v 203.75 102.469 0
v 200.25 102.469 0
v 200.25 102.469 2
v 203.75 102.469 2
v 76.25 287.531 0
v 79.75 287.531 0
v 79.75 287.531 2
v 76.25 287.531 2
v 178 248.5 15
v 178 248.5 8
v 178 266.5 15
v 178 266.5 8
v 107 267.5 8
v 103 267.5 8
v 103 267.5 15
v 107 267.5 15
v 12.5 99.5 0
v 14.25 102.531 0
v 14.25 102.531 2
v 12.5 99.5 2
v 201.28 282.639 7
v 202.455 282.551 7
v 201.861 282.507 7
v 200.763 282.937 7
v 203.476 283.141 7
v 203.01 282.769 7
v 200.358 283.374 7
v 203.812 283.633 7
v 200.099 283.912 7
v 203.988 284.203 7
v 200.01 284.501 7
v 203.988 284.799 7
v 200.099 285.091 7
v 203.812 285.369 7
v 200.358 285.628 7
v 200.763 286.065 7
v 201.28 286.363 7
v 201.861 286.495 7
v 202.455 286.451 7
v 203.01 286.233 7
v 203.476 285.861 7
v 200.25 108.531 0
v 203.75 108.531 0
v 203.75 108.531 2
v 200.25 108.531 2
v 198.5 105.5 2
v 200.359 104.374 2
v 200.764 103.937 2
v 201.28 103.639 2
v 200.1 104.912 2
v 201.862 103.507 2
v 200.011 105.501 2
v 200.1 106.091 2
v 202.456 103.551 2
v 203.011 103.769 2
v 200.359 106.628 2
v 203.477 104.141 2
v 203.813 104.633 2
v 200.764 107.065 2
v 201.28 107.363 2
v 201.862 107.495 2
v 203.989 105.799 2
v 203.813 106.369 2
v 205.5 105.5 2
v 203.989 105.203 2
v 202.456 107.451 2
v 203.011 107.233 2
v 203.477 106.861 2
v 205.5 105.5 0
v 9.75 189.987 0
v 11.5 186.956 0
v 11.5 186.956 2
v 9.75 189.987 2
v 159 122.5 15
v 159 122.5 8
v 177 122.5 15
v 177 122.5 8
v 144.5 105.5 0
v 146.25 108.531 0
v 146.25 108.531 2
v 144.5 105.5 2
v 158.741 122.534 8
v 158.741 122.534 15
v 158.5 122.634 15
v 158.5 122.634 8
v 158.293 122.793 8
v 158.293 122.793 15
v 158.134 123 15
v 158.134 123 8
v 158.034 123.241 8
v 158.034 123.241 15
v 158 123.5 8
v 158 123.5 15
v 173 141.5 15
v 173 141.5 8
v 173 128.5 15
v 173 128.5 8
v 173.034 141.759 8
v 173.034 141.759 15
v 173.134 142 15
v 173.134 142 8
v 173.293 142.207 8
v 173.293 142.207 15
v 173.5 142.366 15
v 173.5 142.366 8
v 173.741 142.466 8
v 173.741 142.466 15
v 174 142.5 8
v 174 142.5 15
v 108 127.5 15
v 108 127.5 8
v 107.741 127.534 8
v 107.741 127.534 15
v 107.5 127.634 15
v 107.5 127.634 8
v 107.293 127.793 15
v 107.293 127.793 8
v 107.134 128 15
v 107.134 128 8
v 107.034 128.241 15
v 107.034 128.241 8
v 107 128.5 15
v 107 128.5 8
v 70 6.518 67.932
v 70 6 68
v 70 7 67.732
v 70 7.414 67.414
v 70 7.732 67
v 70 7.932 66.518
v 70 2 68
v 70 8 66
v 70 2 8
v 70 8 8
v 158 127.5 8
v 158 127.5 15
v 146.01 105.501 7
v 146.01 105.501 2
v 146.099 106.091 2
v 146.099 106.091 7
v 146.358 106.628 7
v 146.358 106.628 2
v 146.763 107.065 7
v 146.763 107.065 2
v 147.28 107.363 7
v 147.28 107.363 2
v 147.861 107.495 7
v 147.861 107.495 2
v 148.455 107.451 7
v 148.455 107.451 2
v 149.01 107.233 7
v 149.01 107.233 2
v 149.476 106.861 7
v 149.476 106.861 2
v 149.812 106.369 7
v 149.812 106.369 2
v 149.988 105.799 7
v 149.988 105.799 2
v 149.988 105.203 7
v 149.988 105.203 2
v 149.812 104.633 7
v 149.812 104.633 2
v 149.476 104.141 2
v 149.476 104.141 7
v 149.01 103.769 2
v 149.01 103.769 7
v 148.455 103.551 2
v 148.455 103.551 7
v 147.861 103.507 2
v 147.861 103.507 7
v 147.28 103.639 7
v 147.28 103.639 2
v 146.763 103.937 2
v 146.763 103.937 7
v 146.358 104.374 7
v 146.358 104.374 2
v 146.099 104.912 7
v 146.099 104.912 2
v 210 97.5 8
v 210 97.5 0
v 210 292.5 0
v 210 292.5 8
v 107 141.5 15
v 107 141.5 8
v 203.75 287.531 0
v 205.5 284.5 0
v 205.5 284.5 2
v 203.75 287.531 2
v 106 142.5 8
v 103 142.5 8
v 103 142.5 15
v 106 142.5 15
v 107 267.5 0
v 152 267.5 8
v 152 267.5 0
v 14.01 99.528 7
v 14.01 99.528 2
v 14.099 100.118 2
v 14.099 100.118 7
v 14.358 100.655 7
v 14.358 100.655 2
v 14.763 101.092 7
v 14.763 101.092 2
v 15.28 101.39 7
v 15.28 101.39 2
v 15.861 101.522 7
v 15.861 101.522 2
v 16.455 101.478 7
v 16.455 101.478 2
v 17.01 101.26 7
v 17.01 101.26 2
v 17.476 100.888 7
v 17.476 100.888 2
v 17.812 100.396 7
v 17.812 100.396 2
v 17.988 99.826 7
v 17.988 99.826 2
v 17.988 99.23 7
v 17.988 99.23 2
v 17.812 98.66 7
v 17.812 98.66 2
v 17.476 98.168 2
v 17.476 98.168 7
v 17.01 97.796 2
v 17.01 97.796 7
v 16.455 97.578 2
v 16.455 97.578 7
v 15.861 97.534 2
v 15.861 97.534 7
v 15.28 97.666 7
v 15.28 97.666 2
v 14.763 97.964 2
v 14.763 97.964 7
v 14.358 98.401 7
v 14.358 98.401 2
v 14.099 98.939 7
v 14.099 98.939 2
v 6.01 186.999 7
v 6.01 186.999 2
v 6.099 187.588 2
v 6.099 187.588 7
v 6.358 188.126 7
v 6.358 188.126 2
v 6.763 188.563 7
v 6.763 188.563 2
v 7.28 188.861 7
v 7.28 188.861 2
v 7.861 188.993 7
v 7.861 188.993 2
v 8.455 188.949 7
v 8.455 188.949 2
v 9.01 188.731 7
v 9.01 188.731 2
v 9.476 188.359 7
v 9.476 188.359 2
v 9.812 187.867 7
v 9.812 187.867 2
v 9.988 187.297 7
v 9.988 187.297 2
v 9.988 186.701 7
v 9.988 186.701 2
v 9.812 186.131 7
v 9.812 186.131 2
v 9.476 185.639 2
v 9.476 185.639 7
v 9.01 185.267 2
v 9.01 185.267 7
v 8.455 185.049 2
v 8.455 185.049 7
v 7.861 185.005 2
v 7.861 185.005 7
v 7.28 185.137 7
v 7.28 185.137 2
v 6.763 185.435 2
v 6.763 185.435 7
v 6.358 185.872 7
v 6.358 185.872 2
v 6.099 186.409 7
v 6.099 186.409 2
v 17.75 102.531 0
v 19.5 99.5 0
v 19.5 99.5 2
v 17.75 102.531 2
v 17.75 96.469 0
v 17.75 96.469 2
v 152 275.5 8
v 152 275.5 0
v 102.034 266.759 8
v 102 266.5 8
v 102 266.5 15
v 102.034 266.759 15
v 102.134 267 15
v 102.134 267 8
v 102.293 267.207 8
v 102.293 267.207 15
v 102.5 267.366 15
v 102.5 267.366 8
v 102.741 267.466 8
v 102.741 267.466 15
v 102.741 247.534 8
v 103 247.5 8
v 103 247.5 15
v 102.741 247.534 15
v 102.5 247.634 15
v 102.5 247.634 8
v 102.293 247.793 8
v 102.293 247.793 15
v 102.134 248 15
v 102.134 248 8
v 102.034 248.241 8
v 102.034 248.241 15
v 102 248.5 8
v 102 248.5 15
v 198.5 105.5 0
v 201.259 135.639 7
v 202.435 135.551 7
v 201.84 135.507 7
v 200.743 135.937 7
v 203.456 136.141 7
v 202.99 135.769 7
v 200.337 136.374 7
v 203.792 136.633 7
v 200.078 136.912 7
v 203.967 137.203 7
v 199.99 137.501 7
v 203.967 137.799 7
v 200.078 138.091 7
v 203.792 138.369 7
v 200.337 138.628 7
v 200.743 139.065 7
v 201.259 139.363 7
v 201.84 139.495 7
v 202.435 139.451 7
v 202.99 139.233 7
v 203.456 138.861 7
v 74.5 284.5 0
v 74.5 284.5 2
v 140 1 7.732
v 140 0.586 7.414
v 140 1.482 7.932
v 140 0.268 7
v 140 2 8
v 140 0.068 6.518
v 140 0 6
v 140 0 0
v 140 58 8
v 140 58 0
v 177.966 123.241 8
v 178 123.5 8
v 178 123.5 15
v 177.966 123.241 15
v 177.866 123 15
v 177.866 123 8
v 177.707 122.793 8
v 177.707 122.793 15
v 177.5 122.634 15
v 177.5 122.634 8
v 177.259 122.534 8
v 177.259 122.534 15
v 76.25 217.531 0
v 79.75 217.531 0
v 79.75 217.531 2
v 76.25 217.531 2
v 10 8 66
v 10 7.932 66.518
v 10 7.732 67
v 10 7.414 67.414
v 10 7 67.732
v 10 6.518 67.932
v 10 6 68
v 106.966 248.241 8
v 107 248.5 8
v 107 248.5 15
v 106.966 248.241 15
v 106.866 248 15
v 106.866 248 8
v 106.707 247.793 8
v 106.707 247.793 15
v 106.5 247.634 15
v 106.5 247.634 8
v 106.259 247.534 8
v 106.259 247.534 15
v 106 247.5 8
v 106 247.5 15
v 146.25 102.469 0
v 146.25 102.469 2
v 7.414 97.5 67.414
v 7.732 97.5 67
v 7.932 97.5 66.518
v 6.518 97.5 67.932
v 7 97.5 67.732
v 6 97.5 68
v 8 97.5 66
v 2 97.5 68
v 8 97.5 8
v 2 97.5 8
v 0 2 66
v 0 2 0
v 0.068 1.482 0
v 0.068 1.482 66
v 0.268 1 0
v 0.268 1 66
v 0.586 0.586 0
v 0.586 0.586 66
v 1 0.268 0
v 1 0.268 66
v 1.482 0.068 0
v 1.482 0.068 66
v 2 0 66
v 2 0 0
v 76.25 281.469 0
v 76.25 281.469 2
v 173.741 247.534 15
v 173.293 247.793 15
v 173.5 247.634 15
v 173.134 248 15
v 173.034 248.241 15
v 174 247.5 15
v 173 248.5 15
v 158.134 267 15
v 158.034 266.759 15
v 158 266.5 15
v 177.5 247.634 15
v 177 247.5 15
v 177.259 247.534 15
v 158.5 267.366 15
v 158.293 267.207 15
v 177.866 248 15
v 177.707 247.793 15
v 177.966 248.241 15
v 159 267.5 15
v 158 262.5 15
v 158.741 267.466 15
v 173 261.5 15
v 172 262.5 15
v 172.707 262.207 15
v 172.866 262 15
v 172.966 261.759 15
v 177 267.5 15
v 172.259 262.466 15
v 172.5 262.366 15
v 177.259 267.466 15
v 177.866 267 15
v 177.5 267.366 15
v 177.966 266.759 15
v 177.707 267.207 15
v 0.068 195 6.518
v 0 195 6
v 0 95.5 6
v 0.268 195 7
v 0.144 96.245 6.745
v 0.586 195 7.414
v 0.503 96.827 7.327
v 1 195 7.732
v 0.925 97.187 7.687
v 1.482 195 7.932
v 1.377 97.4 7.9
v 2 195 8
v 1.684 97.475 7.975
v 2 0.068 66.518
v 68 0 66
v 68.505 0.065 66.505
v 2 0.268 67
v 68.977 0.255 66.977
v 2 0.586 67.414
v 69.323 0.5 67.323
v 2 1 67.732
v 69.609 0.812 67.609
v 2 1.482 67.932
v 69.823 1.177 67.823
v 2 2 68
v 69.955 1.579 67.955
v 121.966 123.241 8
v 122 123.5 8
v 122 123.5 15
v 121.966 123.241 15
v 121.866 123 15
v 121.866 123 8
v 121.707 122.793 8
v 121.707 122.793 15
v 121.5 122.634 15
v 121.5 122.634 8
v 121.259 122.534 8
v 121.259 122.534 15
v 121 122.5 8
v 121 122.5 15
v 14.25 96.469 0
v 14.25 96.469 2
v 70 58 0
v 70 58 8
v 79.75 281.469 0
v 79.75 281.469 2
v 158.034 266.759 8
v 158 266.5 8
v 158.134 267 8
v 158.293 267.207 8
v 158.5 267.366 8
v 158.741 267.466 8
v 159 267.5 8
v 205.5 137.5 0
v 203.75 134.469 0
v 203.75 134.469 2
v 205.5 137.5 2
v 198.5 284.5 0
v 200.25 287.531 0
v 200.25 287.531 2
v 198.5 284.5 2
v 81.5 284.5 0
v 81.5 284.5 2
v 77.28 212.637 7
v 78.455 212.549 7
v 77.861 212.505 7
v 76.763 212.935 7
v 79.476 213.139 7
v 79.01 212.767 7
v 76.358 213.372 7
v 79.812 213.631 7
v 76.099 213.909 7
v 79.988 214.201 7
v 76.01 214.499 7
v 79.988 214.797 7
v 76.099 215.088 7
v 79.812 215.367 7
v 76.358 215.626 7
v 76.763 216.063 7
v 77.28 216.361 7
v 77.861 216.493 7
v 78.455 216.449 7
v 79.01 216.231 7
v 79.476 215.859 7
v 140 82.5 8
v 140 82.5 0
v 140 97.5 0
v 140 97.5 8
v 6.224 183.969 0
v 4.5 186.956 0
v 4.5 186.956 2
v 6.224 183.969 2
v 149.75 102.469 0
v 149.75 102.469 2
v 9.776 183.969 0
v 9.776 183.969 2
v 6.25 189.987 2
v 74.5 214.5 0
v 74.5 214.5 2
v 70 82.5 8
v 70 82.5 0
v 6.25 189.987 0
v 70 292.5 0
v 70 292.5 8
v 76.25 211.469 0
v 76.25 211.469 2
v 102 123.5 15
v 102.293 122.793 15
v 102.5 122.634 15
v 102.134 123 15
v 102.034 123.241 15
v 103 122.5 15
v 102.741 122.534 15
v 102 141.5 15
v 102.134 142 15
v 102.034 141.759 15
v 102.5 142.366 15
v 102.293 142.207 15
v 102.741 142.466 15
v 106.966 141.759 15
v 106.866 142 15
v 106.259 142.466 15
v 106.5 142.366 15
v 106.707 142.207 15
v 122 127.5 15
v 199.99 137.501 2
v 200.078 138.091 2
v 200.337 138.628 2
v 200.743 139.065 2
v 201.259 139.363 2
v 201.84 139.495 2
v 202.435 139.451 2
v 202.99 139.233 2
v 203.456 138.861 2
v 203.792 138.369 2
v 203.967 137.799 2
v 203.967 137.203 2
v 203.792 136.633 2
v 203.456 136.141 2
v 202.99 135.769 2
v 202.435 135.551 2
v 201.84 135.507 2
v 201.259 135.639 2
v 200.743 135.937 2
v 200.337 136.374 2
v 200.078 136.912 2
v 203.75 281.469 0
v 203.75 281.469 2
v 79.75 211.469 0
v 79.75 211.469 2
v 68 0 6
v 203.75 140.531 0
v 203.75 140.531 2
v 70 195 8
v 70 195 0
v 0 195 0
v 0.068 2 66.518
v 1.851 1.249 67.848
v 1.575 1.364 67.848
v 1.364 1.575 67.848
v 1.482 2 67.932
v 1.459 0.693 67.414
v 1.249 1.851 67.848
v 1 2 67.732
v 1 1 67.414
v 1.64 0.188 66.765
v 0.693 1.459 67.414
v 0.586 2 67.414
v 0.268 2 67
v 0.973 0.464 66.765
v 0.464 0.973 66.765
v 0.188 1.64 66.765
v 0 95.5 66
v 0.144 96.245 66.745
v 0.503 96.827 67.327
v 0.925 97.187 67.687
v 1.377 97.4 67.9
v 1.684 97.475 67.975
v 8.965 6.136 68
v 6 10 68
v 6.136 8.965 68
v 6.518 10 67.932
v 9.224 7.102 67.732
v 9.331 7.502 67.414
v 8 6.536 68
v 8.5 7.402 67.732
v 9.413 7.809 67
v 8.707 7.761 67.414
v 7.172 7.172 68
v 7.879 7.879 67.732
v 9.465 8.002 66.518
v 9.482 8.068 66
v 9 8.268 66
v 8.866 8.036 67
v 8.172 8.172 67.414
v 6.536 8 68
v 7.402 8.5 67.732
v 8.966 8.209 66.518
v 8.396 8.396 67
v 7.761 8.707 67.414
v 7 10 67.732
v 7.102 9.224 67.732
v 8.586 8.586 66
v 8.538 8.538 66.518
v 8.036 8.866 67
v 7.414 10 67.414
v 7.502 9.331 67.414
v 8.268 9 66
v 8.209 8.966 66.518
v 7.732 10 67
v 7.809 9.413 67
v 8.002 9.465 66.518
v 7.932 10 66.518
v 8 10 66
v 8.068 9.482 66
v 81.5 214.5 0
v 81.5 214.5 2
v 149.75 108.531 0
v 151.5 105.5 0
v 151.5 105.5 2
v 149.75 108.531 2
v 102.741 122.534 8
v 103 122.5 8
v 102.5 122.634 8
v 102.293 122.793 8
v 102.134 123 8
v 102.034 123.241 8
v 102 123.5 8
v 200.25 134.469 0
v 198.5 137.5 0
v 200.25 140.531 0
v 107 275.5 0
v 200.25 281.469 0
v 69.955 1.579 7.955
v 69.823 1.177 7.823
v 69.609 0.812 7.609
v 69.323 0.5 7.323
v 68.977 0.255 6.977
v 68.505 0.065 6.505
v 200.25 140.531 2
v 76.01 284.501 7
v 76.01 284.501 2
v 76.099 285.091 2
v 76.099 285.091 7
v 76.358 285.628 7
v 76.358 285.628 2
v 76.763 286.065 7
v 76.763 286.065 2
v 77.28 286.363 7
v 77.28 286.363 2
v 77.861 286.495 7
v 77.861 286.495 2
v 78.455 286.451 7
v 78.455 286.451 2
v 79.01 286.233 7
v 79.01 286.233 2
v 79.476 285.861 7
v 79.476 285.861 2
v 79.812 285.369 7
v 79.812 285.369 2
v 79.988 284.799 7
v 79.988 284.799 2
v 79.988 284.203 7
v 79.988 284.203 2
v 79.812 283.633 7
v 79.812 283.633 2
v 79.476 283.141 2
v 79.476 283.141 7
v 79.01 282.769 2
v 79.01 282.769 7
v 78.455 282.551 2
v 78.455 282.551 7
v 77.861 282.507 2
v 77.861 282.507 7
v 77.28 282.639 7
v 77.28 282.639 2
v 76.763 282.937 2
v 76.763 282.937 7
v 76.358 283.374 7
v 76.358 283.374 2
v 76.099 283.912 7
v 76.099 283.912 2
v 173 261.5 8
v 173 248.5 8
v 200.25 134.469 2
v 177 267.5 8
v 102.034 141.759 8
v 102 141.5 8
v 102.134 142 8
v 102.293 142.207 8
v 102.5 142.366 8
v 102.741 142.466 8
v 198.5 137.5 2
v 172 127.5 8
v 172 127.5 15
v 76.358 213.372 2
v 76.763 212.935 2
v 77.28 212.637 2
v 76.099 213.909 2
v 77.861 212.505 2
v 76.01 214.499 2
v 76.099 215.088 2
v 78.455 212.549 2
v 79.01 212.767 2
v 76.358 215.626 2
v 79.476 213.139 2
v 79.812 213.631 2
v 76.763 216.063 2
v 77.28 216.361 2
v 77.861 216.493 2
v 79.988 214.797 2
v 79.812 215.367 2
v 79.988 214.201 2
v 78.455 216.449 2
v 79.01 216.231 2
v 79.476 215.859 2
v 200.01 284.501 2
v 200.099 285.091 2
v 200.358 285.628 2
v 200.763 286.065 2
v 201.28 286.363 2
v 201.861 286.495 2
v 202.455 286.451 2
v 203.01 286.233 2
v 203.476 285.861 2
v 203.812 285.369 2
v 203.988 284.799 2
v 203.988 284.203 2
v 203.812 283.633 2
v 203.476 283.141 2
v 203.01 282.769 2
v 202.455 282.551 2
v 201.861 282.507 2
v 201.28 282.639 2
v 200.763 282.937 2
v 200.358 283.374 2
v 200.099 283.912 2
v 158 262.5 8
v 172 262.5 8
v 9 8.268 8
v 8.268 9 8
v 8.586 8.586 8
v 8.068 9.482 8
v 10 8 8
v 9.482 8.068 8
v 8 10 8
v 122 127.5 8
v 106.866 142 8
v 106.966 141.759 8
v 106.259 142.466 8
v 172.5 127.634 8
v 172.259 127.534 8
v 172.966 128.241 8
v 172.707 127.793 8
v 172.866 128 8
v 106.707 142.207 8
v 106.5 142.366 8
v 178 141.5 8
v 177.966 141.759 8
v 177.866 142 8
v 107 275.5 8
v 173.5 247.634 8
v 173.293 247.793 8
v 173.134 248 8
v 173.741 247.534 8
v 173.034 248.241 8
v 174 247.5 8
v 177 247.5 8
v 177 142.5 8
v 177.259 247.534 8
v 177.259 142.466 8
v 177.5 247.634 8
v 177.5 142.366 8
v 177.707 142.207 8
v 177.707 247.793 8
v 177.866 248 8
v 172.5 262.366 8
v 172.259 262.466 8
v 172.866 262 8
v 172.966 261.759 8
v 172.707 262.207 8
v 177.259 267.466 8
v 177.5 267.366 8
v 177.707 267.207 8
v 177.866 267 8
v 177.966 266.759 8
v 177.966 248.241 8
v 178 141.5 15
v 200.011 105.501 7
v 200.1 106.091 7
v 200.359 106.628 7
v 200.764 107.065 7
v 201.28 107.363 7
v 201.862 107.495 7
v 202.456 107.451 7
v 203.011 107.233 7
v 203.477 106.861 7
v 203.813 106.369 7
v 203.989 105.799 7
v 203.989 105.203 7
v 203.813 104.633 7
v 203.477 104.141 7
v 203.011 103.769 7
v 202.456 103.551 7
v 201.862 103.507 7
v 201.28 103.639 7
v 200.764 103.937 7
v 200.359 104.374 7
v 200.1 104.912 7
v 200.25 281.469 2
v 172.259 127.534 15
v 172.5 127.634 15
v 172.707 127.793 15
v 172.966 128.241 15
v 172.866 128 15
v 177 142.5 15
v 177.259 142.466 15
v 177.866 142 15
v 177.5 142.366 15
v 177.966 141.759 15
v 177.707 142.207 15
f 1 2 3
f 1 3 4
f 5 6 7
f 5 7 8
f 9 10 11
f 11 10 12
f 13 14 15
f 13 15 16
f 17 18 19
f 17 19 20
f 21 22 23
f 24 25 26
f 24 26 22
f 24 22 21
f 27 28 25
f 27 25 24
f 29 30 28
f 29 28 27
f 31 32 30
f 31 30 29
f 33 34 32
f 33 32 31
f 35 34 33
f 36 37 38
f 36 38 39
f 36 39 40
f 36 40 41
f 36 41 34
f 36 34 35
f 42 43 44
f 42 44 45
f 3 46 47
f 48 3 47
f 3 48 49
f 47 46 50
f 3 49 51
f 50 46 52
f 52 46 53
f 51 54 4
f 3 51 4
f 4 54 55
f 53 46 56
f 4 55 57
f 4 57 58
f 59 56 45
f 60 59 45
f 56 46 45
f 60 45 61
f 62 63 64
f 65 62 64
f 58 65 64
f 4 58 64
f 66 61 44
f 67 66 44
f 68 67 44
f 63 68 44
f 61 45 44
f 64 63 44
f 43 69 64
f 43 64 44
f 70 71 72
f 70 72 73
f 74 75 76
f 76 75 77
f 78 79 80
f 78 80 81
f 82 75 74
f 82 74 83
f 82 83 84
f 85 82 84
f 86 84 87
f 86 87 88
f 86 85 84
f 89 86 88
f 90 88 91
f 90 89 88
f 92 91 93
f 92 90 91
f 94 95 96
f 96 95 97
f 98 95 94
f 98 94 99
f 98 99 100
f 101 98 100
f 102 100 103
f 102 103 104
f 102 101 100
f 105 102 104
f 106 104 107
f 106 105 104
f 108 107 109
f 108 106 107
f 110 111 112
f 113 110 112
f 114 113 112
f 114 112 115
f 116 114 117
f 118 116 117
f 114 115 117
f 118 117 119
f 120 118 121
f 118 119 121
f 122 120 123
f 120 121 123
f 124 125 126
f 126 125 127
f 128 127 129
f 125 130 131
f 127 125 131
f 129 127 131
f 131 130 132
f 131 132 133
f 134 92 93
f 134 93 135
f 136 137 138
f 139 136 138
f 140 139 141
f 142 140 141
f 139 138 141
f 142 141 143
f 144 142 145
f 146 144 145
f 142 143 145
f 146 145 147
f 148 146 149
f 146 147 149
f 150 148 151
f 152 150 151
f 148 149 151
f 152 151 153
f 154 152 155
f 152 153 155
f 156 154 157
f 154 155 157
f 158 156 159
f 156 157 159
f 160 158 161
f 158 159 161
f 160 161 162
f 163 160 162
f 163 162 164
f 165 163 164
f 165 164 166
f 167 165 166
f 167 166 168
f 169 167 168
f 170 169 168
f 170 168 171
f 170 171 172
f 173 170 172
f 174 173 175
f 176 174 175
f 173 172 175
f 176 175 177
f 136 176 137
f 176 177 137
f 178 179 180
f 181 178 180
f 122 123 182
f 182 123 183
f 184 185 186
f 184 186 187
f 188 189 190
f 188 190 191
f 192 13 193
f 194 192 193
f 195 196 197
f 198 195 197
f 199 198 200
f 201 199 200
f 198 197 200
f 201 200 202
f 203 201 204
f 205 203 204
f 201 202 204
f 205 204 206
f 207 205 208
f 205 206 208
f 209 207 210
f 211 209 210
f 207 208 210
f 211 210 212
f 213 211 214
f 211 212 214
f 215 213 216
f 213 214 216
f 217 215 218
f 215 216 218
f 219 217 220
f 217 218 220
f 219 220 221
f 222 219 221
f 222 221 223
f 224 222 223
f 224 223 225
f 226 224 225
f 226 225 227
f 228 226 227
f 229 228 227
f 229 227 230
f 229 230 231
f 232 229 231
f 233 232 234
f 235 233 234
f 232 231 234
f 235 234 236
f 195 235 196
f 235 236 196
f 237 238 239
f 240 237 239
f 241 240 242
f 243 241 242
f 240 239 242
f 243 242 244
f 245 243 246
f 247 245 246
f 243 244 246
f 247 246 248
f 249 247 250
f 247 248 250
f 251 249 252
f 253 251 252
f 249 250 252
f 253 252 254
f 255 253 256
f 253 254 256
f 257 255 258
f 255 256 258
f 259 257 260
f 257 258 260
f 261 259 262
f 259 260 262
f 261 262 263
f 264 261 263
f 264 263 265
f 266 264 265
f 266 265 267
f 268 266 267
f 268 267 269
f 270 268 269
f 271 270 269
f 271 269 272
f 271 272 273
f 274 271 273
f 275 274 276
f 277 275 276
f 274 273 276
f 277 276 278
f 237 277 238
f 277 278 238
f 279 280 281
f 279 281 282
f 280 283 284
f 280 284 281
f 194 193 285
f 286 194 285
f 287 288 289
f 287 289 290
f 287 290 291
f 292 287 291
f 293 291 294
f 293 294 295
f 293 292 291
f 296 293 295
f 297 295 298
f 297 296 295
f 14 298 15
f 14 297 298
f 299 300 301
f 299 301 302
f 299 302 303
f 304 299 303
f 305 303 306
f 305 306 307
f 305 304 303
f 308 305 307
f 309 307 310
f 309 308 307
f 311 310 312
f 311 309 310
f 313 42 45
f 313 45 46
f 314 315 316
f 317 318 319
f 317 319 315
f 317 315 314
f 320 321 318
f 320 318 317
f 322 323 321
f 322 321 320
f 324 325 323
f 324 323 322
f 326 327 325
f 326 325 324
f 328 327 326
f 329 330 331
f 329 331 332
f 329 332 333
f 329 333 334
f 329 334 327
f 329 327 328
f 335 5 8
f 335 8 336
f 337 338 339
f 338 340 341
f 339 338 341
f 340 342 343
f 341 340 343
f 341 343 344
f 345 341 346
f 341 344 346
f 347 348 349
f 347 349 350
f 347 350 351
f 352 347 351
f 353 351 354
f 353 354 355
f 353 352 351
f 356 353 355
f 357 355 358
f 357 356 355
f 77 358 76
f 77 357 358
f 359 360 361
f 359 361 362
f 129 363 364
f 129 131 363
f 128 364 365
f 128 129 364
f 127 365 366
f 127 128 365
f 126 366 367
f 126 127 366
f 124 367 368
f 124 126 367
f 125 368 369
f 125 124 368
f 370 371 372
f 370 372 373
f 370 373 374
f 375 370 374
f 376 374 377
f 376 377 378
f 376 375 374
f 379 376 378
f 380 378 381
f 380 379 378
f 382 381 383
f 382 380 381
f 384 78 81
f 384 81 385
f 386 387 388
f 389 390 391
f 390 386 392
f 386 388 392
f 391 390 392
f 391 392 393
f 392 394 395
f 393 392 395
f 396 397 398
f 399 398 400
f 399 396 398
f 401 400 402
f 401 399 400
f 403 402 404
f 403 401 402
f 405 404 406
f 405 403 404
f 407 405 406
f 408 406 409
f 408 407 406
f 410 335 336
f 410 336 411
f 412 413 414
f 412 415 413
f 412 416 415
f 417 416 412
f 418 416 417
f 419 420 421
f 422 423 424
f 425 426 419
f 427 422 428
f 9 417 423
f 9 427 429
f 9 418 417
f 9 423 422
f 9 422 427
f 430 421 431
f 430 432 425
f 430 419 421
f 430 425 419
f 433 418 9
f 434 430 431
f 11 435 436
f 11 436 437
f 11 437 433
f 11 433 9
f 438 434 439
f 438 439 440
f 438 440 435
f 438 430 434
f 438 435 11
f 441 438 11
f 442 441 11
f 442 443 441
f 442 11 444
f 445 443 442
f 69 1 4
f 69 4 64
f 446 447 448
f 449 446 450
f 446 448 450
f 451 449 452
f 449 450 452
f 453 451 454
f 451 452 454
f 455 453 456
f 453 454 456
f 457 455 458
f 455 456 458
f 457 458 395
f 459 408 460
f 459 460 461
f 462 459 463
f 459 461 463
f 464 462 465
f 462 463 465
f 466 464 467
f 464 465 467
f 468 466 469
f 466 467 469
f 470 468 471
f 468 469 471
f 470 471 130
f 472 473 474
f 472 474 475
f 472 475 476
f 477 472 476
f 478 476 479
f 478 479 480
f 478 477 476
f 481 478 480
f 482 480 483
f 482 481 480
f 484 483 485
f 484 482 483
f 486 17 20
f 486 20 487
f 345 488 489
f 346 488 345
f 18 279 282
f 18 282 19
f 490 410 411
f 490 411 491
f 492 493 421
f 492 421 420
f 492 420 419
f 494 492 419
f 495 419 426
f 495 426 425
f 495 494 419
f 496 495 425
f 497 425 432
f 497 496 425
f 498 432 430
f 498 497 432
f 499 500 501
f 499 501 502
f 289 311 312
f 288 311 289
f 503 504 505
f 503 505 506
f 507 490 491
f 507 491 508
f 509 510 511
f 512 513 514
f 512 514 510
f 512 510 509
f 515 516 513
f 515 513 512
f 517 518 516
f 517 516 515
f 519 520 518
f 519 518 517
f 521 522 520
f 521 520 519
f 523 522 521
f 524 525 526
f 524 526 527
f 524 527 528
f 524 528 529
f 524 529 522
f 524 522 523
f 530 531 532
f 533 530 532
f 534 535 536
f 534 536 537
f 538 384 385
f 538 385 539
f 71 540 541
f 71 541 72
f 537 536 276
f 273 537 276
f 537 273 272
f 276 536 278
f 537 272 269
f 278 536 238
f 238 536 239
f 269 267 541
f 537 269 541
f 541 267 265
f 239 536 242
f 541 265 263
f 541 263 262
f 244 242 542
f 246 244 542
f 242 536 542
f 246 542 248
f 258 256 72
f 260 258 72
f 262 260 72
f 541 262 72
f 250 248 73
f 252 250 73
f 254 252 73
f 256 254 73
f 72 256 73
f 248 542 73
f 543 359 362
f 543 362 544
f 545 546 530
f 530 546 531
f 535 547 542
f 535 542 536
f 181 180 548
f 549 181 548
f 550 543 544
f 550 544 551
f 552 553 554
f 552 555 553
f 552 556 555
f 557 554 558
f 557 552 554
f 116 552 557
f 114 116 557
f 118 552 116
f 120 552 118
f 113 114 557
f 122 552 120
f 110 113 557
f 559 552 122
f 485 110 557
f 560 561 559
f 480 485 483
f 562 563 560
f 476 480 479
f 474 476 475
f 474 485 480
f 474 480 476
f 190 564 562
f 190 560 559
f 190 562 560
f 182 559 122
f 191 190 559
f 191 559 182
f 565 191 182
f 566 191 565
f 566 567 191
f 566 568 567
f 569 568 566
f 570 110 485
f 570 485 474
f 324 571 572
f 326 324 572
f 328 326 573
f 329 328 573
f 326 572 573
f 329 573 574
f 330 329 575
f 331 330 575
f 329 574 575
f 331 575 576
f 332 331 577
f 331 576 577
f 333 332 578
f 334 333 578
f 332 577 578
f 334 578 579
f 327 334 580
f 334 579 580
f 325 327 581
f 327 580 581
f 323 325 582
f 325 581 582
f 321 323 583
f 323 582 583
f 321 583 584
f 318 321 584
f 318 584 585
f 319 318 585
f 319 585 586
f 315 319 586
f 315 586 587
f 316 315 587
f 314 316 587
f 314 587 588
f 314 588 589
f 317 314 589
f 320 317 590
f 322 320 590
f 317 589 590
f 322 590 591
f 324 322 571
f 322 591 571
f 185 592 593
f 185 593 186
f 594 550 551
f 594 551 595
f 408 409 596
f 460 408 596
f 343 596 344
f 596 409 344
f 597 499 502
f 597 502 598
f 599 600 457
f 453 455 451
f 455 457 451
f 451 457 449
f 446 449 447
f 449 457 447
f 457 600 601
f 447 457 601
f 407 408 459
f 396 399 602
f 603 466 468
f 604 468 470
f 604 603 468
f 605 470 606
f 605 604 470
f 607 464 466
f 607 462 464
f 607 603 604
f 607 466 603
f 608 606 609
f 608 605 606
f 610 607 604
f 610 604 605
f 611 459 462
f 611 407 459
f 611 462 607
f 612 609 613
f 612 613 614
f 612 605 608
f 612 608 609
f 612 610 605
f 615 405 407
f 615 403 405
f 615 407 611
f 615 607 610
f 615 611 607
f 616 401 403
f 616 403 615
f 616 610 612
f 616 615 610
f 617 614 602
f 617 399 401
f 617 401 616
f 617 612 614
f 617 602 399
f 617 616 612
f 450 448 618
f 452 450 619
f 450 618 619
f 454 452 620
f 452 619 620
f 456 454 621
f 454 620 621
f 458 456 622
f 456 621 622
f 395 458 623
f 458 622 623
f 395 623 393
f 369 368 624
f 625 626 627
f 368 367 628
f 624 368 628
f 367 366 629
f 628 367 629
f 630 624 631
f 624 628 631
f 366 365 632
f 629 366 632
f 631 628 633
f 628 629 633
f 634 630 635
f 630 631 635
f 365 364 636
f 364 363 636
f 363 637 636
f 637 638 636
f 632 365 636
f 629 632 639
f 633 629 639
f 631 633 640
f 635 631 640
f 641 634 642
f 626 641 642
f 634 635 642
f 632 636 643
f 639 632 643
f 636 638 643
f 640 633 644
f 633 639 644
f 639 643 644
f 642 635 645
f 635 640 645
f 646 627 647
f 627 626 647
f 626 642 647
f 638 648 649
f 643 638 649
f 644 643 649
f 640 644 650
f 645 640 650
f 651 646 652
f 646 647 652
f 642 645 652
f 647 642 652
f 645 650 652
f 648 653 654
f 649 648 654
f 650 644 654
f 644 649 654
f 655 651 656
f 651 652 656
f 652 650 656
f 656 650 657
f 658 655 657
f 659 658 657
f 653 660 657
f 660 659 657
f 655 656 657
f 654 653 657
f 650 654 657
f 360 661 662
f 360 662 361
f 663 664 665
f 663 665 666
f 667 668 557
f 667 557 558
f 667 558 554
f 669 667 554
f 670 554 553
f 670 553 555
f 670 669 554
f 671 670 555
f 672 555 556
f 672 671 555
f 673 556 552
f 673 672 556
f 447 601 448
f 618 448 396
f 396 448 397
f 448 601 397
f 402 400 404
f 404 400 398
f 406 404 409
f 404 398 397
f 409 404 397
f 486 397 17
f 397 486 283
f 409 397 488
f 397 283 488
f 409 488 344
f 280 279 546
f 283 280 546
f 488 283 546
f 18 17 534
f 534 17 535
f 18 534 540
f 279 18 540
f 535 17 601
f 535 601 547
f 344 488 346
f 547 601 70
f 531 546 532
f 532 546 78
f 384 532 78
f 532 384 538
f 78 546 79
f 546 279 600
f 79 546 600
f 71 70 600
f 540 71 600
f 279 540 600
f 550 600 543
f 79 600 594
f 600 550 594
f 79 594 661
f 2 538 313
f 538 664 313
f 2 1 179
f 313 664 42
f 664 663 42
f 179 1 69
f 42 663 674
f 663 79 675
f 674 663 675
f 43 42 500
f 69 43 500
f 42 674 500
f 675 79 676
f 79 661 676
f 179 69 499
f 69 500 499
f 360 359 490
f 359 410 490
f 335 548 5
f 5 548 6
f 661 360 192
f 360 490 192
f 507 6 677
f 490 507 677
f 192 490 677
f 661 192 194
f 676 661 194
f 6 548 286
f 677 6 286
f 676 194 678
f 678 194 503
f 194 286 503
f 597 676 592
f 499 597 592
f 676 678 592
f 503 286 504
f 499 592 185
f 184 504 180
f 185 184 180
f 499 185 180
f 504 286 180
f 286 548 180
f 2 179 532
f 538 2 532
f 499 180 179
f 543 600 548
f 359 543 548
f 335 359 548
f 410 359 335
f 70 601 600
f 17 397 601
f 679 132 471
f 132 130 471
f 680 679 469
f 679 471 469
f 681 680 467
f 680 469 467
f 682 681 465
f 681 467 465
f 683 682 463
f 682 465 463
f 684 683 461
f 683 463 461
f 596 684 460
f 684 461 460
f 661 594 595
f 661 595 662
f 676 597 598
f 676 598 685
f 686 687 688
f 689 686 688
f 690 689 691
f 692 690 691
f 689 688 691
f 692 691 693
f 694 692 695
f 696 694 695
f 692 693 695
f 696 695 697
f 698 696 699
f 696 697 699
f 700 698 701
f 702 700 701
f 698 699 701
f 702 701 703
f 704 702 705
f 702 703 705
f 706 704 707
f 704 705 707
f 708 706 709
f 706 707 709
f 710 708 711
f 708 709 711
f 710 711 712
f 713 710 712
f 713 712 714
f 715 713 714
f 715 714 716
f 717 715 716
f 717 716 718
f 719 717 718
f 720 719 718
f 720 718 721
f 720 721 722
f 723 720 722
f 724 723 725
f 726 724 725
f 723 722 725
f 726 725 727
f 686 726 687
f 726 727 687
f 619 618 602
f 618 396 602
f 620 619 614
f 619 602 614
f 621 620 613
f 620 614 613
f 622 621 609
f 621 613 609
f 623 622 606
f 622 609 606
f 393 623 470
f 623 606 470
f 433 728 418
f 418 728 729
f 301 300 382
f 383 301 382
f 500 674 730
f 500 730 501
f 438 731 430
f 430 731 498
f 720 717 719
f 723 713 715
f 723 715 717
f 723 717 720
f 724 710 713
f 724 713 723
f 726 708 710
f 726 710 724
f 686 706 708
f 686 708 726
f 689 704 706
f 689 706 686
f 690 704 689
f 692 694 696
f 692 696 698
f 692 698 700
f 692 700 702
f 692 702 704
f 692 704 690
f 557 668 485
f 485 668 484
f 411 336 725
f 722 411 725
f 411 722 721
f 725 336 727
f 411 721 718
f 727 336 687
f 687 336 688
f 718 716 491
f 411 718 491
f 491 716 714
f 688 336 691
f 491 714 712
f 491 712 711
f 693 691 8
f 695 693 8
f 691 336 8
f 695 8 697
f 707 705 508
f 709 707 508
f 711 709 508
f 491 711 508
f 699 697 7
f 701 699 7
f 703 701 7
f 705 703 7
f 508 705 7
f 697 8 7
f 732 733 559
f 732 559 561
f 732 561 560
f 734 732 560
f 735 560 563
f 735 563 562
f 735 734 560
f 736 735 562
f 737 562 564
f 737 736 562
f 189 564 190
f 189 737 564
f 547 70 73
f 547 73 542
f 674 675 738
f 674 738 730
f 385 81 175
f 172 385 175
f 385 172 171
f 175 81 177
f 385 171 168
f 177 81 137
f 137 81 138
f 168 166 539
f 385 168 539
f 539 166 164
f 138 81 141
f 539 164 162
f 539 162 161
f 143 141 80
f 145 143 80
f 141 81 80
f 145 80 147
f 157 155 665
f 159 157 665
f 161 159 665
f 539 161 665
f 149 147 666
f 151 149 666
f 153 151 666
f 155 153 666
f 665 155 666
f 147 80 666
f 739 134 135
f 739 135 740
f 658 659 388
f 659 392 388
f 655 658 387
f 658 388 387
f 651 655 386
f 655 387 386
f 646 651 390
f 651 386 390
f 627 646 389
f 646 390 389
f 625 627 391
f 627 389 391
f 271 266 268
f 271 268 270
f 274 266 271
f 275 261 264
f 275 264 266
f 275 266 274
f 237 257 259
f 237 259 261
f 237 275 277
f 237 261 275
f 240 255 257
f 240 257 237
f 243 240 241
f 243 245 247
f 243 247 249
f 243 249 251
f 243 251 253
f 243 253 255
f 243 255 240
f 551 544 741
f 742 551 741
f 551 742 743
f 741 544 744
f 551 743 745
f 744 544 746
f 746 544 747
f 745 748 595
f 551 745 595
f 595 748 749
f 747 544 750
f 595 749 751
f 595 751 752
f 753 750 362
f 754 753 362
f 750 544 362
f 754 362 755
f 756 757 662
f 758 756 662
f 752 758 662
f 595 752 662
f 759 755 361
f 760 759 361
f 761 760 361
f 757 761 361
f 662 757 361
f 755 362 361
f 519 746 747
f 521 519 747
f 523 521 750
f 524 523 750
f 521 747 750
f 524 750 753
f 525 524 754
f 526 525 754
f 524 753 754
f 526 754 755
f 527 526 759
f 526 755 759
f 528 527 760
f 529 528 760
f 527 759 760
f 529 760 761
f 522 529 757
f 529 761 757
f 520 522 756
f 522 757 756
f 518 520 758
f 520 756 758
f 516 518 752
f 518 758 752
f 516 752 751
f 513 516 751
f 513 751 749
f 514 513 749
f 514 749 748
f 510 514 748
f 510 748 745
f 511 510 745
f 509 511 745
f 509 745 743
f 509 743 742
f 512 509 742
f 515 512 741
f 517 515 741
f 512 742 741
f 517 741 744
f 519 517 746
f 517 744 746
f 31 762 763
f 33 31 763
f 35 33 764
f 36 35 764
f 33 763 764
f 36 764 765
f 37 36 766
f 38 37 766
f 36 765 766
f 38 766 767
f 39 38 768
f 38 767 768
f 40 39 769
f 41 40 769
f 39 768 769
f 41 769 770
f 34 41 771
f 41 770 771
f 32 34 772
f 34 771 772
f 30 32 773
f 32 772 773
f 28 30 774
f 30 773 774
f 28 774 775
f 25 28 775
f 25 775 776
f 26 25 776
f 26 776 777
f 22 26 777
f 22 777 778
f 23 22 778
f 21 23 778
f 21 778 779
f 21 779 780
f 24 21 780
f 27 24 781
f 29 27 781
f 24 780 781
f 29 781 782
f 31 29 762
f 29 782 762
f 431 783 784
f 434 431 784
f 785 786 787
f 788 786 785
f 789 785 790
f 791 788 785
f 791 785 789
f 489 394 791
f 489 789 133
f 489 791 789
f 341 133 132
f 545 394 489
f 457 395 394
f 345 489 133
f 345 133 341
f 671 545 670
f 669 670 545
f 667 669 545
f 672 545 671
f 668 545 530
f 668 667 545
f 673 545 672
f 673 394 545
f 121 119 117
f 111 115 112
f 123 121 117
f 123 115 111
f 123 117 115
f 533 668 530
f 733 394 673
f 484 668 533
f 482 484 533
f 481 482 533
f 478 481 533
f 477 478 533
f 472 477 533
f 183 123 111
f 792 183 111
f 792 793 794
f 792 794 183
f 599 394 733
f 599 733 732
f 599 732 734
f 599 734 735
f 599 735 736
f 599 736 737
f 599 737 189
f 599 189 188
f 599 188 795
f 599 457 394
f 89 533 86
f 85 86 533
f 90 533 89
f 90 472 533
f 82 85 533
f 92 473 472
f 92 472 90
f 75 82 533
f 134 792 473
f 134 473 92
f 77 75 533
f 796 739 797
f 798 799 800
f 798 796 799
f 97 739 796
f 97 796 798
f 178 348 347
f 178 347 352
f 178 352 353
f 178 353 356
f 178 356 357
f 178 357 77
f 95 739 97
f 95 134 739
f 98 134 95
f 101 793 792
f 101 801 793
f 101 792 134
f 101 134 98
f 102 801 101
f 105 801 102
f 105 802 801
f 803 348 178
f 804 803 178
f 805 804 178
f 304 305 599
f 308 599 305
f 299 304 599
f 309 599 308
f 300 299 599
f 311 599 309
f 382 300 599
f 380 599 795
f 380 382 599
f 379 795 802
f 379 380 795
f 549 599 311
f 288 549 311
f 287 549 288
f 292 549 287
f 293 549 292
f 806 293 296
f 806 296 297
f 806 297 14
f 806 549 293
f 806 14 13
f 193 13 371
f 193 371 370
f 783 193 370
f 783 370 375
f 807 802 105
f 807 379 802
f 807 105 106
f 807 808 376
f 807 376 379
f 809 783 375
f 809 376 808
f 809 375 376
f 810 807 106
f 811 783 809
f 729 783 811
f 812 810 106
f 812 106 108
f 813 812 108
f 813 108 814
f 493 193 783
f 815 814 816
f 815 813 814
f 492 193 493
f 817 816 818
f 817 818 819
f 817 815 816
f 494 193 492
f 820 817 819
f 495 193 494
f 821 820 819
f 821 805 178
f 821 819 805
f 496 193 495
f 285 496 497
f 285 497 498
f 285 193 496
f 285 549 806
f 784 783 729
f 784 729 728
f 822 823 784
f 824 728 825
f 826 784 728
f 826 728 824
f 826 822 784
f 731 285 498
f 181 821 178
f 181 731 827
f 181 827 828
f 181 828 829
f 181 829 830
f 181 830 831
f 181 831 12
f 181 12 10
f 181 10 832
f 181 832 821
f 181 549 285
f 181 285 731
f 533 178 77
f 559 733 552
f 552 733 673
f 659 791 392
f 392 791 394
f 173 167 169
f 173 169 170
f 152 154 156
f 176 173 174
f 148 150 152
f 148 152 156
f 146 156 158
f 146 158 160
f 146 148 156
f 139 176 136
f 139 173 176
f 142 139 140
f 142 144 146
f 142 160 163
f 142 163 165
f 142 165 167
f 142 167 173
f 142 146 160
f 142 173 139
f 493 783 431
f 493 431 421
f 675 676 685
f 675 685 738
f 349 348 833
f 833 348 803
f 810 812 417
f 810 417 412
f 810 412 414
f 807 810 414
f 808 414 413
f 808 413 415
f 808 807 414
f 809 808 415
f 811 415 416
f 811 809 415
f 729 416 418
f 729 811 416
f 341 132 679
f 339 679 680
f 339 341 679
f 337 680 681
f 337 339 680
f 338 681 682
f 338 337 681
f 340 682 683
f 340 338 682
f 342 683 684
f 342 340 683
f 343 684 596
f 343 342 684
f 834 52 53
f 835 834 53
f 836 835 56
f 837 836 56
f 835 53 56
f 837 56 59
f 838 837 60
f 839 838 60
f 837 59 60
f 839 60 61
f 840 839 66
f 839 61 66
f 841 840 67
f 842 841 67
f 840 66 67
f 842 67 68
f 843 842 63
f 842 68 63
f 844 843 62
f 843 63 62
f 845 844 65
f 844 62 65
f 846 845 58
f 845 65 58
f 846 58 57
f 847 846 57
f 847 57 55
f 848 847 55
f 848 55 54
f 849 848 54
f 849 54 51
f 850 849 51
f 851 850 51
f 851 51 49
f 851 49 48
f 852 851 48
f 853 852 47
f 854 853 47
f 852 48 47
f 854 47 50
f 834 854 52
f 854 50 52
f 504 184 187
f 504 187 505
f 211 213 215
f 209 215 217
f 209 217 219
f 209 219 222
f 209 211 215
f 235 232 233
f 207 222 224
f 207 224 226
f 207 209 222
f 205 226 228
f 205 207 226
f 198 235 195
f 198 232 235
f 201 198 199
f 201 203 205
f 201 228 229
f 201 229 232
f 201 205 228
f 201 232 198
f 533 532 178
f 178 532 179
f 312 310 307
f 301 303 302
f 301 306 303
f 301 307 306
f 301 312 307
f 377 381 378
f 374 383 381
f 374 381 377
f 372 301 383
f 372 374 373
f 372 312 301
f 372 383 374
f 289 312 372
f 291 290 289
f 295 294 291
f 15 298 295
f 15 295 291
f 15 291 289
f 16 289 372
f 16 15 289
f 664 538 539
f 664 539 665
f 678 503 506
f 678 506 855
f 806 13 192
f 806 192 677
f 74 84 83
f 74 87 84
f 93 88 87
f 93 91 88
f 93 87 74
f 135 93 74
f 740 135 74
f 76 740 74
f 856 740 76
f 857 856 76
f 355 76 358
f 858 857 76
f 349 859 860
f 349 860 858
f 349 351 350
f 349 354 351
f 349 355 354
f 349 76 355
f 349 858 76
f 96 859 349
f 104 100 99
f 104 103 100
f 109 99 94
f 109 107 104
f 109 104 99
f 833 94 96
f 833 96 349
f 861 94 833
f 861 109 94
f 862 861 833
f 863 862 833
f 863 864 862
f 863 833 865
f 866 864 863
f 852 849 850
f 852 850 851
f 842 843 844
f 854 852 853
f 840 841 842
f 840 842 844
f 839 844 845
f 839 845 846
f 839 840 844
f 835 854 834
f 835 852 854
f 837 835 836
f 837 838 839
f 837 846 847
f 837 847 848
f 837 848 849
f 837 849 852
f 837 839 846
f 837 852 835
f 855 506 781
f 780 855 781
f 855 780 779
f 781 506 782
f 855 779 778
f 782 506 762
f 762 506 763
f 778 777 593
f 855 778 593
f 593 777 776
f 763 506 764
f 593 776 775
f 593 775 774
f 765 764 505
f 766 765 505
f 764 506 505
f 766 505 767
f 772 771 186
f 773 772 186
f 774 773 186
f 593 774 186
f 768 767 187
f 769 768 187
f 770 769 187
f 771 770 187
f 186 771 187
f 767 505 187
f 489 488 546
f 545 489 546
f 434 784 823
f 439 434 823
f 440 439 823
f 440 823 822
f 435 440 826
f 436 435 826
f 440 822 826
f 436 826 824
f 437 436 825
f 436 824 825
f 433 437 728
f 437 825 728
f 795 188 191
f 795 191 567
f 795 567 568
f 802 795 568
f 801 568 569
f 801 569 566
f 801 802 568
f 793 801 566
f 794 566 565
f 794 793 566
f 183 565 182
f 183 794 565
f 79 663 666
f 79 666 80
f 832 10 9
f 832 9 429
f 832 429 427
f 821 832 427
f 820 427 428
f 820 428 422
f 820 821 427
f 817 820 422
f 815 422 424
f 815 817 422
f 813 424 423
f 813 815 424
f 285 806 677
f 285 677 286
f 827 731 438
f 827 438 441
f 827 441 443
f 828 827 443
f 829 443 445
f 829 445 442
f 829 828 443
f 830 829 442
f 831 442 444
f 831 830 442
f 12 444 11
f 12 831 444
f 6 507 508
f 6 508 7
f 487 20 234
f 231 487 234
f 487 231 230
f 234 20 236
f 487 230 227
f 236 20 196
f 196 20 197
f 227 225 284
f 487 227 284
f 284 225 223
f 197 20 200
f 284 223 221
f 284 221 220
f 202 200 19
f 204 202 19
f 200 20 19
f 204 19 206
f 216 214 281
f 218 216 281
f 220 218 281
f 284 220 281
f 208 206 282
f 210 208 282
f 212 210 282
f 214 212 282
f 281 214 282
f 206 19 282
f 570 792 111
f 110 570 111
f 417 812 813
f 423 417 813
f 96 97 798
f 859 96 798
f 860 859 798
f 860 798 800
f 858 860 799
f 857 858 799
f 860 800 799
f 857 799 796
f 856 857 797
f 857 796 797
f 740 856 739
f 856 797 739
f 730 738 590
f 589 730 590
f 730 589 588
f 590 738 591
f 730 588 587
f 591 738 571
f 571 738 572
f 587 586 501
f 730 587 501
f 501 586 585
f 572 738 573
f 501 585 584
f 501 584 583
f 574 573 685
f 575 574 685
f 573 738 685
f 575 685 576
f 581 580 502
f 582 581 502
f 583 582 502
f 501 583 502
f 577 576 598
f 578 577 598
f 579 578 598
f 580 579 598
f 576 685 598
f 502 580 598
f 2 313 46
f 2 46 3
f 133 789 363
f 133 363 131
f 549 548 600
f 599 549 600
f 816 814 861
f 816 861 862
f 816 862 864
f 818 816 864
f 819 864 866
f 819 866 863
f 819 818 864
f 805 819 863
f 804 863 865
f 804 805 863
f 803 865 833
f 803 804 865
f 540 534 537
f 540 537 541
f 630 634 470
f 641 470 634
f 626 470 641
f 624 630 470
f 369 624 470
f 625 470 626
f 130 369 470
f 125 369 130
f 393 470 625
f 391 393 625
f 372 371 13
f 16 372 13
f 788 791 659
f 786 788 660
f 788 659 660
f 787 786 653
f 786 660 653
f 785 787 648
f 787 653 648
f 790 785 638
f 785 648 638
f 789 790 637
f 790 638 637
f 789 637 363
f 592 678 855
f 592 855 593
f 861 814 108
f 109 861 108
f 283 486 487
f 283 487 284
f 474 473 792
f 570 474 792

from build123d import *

# Parameters (mm, degrees)
EXTRUDE_1_DEPTH         = 8
CUT_EXTRUDE_1_DEPTH     = 2
SKETCH_3_R              = 2
CUT_EXTRUDE_2_DEPTH     = 5
SKETCH_4_W              = 62
SKETCH_4_H              = 8
EXTRUDE_2_DEPTH         = 60
FILLET_1_R              = 2
SKETCH_5_W              = 5
SKETCH_5_H              = 20
SKETCH_5_W_2            = 15
SKETCH_5_H_2            = 5
SKETCH_5_H_3            = 15
EXTRUDE_4_DEPTH         = 7
SKETCH_6_W              = 45
SKETCH_6_H              = 8
CUT_EXTRUDE_3_DEPTH     = 366.042805709
CUT_EXTRUDE_START       = -8
CUT_EXTRUDE_4_OUTLINE_W = 70
CUT_EXTRUDE_4_OUTLINE_H = 24.5
CUT_EXTRUDE_4_DEPTH     = 8
CUT_EXTRUDE_4_2_DEPTH   = 7
CUT_EXTRUDE_4_3_DEPTH   = 7


# Read off the part's stored shape, not the designer's step: 컷-돌출4
with BuildPart() as part:
    # 스케치1 → 보스-돌출1 (new body)
    with BuildSketch(Plane.XY):
        Polygon((0, 0), (140, 0), (140, 97.5), (210, 97.5), (210, 292.5), (70, 292.5), (70, 195), (0, 195), align=None)
    extrude(amount=EXTRUDE_1_DEPTH)

    # 스케치2 → 컷-돌출1 (cut)
    with BuildSketch(Plane.XY):
        Polygon((200.25, 287.531088913), (198.5, 284.5), (200.25, 281.468911087), (203.75, 281.468911087), (205.5, 284.5), (203.75, 287.531088913), align=None)
        Polygon((76.25, 287.531088913), (74.5, 284.5), (76.25, 281.468911087), (79.75, 281.468911087), (81.5, 284.5), (79.75, 287.531088913), align=None)
        Polygon((6.25, 189.986613874), (4.5, 186.955524961), (6.224322324, 183.968911087), (9.775677676, 183.968911087), (11.5, 186.955524961), (9.75, 189.986613874), align=None)
        Polygon((76.25, 217.531088913), (74.5, 214.5), (76.25, 211.468911087), (79.75, 211.468911087), (81.5, 214.5), (79.75, 217.531088913), align=None)
        Polygon((200.25, 140.531088913), (198.5, 137.5), (200.25, 134.468911087), (203.75, 134.468911087), (205.5, 137.5), (203.75, 140.531088913), align=None)
        Polygon((200.25, 108.531088913), (198.5, 105.5), (200.25, 102.468911087), (203.75, 102.468911087), (205.5, 105.5), (203.75, 108.531088913), align=None)
        Polygon((144.5, 105.5), (146.25, 102.468911087), (149.75, 102.468911087), (151.5, 105.5), (149.75, 108.531088913), (146.25, 108.531088913), align=None)
        Polygon((14.25, 102.531088913), (12.5, 99.5), (14.25, 96.468911087), (17.75, 96.468911087), (19.5, 99.5), (17.75, 102.531088913), align=None)
    extrude(amount=CUT_EXTRUDE_1_DEPTH, mode=Mode.SUBTRACT)

    # 스케치3 → 컷-돌출2 (cut)
    with BuildSketch(Plane(origin=(0, 0, 2), x_dir=(-1, 0, 0), z_dir=(0, 0, -1))):
        with Locations((-202.01036292, 284.501088913)):
            Circle(SKETCH_3_R)
        with Locations((-78.01036292, 284.501088913)):
            Circle(SKETCH_3_R)
        with Locations((-78.01036292, 214.498911087)):
            Circle(SKETCH_3_R)
        with Locations((-8.01036292, 186.998911087)):
            Circle(SKETCH_3_R)
        with Locations((-201.989637708, 137.501088913)):
            Circle(SKETCH_3_R)
        with Locations((-202.011036292, 105.501088913)):
            Circle(SKETCH_3_R)
        with Locations((-148.01036292, 105.501088913)):
            Circle(SKETCH_3_R)
        with Locations((-16.01036292, 99.528088913)):
            Circle(SKETCH_3_R)
    extrude(amount=-CUT_EXTRUDE_2_DEPTH, mode=Mode.SUBTRACT)

    # 스케치4 → 보스-돌출2 (add)
    with BuildSketch(Plane.XY.offset(8)):
        Polygon((0, 97.5), (0, 0), (8, 0), (8, 8), (8, 97.5), align=None)
        with Locations((39, 4)):
            Rectangle(SKETCH_4_W, SKETCH_4_H)
    extrude(amount=EXTRUDE_2_DEPTH)

    # 필렛1
    fillet_1_edges = [part.edges().sort_by_distance(p)[0] for p in [
        (0, 0, 34),
        (105, 0, 8),
        (70, 0, 38),
        (8, 8, 38),
        (0, 97.5, 38),
        (35, 0, 68),
        (39, 8, 68),
        (8, 52.75, 68),
        (0, 48.75, 68),
        (0, 146.25, 8),
    ]]
    fillet(fillet_1_edges, radius=FILLET_1_R)

    # 스케치5 → 보스-돌출4 (add)
    with BuildSketch(Plane.XY.offset(8)):
        with Locations((104.5, 257.5)):
            Rectangle(SKETCH_5_W, SKETCH_5_H)
        with Locations((165.5, 265)):
            Rectangle(SKETCH_5_W_2, SKETCH_5_H_2)
        Polygon((173, 267.5), (173, 262.5), (173, 247.5), (178, 247.5), (178, 267.5), align=None)
        Polygon((122, 127.5), (107, 127.5), (102, 127.5), (102, 122.5), (122, 122.5), align=None)
        with Locations((104.5, 135)):
            Rectangle(SKETCH_5_W, SKETCH_5_H_3)
        with Locations((165.5, 125)):
            Rectangle(SKETCH_5_W_2, SKETCH_5_H_2)
        Polygon((173, 142.5), (173, 127.5), (173, 122.5), (178, 122.5), (178, 142.5), align=None)
    extrude(amount=EXTRUDE_4_DEPTH)

    # 스케치6 → 컷-돌출3 (cut, through all)
    with BuildSketch(Plane.XY.offset(8)):
        with Locations((129.5, 271.5)):
            Rectangle(SKETCH_6_W, SKETCH_6_H)
    extrude(amount=-CUT_EXTRUDE_3_DEPTH, mode=Mode.SUBTRACT)

    # 컷-돌출4 outline → 컷-돌출4 (cut)
    with BuildSketch(Plane.XY.offset(8).offset(CUT_EXTRUDE_START)):
        with Locations((105, 70.25)):
            Rectangle(CUT_EXTRUDE_4_OUTLINE_W, CUT_EXTRUDE_4_OUTLINE_H)
    extrude(amount=CUT_EXTRUDE_4_DEPTH, mode=Mode.SUBTRACT)

    # Cut-Extrude 4 2 outline → Cut-Extrude 4 2 (cut)
    with BuildSketch(Plane.XY.offset(8)):
        with BuildLine():
            Line((173, 142.5), (173, 141.5))
            ThreePointArc((173, 141.5), (173.292893219, 142.207106781), (174, 142.5))
            Line((174, 142.5), (173, 142.5))
        make_face()
        with BuildLine():
            Line((178, 142.5), (177, 142.5))
            ThreePointArc((177, 142.5), (177.707106781, 142.207106781), (178, 141.5))
            Line((178, 141.5), (178, 142.5))
        make_face()
        with BuildLine():
            Line((178, 122.5), (178, 123.5))
            ThreePointArc((178, 123.5), (177.707106781, 122.792893219), (177, 122.5))
            Line((177, 122.5), (178, 122.5))
        make_face()
        with BuildLine():
            ThreePointArc((159, 122.5), (158.292893219, 122.792893219), (158, 123.5))
            Line((158, 123.5), (158, 122.5))
            Line((158, 122.5), (159, 122.5))
        make_face()
        with BuildLine():
            Line((107, 142.5), (106, 142.5))
            ThreePointArc((106, 142.5), (106.707106781, 142.207106781), (107, 141.5))
            Line((107, 141.5), (107, 142.5))
        make_face()
        with BuildLine():
            ThreePointArc((102, 141.5), (102.292893219, 142.207106781), (103, 142.5))
            Line((103, 142.5), (102, 142.5))
            Line((102, 142.5), (102, 141.5))
        make_face()
        with BuildLine():
            ThreePointArc((103, 122.5), (102.292893219, 122.792893219), (102, 123.5))
            Line((102, 123.5), (102, 122.5))
            Line((102, 122.5), (103, 122.5))
        make_face()
        with BuildLine():
            Line((122, 122.5), (122, 123.5))
            ThreePointArc((122, 123.5), (121.707106781, 122.792893219), (121, 122.5))
            Line((121, 122.5), (122, 122.5))
        make_face()
        with BuildLine():
            Line((107, 247.5), (107, 248.5))
            ThreePointArc((107, 248.5), (106.707106781, 247.792893219), (106, 247.5))
            Line((106, 247.5), (107, 247.5))
        make_face()
        with BuildLine():
            Line((102, 247.5), (103, 247.5))
            ThreePointArc((103, 247.5), (102.292893219, 247.792893219), (102, 248.5))
            Line((102, 248.5), (102, 247.5))
        make_face()
        with BuildLine():
            ThreePointArc((102, 266.5), (102.292893219, 267.207106781), (103, 267.5))
            Line((103, 267.5), (102, 267.5))
            Line((102, 267.5), (102, 266.5))
        make_face()
        with BuildLine():
            ThreePointArc((174, 247.5), (173.292893219, 247.792893219), (173, 248.5))
            Line((173, 248.5), (173, 247.5))
            Line((173, 247.5), (174, 247.5))
        make_face()
        with BuildLine():
            ThreePointArc((178, 248.5), (177.707106781, 247.792893219), (177, 247.5))
            Line((177, 247.5), (178, 247.5))
            Line((178, 247.5), (178, 248.5))
        make_face()
        with BuildLine():
            ThreePointArc((177, 267.5), (177.707106781, 267.207106781), (178, 266.5))
            Line((178, 266.5), (178, 267.5))
            Line((178, 267.5), (177, 267.5))
        make_face()
        with BuildLine():
            Line((158, 267.5), (158, 266.5))
            ThreePointArc((158, 266.5), (158.292893219, 267.207106781), (159, 267.5))
            Line((159, 267.5), (158, 267.5))
        make_face()
    extrude(amount=CUT_EXTRUDE_4_2_DEPTH, mode=Mode.SUBTRACT)

    # Cut-Extrude 4 3 outline → Cut-Extrude 4 3 (add)
    with BuildSketch(Plane.XY.offset(8)):
        with BuildLine():
            Line((173, 127.5), (173, 128.5))
            ThreePointArc((173, 128.5), (172.707106781, 127.792893219), (172, 127.5))
            Line((172, 127.5), (173, 127.5))
        make_face()
        with BuildLine():
            ThreePointArc((108, 127.5), (107.292893219, 127.792893219), (107, 128.5))
            Line((107, 128.5), (107, 127.5))
            Line((107, 127.5), (108, 127.5))
        make_face()
        with BuildLine():
            ThreePointArc((172, 262.5), (172.707106781, 262.207106781), (173, 261.5))
            Line((173, 261.5), (173, 262.5))
            Line((173, 262.5), (172, 262.5))
        make_face()
    extrude(amount=CUT_EXTRUDE_4_3_DEPTH)


solid = part.part
